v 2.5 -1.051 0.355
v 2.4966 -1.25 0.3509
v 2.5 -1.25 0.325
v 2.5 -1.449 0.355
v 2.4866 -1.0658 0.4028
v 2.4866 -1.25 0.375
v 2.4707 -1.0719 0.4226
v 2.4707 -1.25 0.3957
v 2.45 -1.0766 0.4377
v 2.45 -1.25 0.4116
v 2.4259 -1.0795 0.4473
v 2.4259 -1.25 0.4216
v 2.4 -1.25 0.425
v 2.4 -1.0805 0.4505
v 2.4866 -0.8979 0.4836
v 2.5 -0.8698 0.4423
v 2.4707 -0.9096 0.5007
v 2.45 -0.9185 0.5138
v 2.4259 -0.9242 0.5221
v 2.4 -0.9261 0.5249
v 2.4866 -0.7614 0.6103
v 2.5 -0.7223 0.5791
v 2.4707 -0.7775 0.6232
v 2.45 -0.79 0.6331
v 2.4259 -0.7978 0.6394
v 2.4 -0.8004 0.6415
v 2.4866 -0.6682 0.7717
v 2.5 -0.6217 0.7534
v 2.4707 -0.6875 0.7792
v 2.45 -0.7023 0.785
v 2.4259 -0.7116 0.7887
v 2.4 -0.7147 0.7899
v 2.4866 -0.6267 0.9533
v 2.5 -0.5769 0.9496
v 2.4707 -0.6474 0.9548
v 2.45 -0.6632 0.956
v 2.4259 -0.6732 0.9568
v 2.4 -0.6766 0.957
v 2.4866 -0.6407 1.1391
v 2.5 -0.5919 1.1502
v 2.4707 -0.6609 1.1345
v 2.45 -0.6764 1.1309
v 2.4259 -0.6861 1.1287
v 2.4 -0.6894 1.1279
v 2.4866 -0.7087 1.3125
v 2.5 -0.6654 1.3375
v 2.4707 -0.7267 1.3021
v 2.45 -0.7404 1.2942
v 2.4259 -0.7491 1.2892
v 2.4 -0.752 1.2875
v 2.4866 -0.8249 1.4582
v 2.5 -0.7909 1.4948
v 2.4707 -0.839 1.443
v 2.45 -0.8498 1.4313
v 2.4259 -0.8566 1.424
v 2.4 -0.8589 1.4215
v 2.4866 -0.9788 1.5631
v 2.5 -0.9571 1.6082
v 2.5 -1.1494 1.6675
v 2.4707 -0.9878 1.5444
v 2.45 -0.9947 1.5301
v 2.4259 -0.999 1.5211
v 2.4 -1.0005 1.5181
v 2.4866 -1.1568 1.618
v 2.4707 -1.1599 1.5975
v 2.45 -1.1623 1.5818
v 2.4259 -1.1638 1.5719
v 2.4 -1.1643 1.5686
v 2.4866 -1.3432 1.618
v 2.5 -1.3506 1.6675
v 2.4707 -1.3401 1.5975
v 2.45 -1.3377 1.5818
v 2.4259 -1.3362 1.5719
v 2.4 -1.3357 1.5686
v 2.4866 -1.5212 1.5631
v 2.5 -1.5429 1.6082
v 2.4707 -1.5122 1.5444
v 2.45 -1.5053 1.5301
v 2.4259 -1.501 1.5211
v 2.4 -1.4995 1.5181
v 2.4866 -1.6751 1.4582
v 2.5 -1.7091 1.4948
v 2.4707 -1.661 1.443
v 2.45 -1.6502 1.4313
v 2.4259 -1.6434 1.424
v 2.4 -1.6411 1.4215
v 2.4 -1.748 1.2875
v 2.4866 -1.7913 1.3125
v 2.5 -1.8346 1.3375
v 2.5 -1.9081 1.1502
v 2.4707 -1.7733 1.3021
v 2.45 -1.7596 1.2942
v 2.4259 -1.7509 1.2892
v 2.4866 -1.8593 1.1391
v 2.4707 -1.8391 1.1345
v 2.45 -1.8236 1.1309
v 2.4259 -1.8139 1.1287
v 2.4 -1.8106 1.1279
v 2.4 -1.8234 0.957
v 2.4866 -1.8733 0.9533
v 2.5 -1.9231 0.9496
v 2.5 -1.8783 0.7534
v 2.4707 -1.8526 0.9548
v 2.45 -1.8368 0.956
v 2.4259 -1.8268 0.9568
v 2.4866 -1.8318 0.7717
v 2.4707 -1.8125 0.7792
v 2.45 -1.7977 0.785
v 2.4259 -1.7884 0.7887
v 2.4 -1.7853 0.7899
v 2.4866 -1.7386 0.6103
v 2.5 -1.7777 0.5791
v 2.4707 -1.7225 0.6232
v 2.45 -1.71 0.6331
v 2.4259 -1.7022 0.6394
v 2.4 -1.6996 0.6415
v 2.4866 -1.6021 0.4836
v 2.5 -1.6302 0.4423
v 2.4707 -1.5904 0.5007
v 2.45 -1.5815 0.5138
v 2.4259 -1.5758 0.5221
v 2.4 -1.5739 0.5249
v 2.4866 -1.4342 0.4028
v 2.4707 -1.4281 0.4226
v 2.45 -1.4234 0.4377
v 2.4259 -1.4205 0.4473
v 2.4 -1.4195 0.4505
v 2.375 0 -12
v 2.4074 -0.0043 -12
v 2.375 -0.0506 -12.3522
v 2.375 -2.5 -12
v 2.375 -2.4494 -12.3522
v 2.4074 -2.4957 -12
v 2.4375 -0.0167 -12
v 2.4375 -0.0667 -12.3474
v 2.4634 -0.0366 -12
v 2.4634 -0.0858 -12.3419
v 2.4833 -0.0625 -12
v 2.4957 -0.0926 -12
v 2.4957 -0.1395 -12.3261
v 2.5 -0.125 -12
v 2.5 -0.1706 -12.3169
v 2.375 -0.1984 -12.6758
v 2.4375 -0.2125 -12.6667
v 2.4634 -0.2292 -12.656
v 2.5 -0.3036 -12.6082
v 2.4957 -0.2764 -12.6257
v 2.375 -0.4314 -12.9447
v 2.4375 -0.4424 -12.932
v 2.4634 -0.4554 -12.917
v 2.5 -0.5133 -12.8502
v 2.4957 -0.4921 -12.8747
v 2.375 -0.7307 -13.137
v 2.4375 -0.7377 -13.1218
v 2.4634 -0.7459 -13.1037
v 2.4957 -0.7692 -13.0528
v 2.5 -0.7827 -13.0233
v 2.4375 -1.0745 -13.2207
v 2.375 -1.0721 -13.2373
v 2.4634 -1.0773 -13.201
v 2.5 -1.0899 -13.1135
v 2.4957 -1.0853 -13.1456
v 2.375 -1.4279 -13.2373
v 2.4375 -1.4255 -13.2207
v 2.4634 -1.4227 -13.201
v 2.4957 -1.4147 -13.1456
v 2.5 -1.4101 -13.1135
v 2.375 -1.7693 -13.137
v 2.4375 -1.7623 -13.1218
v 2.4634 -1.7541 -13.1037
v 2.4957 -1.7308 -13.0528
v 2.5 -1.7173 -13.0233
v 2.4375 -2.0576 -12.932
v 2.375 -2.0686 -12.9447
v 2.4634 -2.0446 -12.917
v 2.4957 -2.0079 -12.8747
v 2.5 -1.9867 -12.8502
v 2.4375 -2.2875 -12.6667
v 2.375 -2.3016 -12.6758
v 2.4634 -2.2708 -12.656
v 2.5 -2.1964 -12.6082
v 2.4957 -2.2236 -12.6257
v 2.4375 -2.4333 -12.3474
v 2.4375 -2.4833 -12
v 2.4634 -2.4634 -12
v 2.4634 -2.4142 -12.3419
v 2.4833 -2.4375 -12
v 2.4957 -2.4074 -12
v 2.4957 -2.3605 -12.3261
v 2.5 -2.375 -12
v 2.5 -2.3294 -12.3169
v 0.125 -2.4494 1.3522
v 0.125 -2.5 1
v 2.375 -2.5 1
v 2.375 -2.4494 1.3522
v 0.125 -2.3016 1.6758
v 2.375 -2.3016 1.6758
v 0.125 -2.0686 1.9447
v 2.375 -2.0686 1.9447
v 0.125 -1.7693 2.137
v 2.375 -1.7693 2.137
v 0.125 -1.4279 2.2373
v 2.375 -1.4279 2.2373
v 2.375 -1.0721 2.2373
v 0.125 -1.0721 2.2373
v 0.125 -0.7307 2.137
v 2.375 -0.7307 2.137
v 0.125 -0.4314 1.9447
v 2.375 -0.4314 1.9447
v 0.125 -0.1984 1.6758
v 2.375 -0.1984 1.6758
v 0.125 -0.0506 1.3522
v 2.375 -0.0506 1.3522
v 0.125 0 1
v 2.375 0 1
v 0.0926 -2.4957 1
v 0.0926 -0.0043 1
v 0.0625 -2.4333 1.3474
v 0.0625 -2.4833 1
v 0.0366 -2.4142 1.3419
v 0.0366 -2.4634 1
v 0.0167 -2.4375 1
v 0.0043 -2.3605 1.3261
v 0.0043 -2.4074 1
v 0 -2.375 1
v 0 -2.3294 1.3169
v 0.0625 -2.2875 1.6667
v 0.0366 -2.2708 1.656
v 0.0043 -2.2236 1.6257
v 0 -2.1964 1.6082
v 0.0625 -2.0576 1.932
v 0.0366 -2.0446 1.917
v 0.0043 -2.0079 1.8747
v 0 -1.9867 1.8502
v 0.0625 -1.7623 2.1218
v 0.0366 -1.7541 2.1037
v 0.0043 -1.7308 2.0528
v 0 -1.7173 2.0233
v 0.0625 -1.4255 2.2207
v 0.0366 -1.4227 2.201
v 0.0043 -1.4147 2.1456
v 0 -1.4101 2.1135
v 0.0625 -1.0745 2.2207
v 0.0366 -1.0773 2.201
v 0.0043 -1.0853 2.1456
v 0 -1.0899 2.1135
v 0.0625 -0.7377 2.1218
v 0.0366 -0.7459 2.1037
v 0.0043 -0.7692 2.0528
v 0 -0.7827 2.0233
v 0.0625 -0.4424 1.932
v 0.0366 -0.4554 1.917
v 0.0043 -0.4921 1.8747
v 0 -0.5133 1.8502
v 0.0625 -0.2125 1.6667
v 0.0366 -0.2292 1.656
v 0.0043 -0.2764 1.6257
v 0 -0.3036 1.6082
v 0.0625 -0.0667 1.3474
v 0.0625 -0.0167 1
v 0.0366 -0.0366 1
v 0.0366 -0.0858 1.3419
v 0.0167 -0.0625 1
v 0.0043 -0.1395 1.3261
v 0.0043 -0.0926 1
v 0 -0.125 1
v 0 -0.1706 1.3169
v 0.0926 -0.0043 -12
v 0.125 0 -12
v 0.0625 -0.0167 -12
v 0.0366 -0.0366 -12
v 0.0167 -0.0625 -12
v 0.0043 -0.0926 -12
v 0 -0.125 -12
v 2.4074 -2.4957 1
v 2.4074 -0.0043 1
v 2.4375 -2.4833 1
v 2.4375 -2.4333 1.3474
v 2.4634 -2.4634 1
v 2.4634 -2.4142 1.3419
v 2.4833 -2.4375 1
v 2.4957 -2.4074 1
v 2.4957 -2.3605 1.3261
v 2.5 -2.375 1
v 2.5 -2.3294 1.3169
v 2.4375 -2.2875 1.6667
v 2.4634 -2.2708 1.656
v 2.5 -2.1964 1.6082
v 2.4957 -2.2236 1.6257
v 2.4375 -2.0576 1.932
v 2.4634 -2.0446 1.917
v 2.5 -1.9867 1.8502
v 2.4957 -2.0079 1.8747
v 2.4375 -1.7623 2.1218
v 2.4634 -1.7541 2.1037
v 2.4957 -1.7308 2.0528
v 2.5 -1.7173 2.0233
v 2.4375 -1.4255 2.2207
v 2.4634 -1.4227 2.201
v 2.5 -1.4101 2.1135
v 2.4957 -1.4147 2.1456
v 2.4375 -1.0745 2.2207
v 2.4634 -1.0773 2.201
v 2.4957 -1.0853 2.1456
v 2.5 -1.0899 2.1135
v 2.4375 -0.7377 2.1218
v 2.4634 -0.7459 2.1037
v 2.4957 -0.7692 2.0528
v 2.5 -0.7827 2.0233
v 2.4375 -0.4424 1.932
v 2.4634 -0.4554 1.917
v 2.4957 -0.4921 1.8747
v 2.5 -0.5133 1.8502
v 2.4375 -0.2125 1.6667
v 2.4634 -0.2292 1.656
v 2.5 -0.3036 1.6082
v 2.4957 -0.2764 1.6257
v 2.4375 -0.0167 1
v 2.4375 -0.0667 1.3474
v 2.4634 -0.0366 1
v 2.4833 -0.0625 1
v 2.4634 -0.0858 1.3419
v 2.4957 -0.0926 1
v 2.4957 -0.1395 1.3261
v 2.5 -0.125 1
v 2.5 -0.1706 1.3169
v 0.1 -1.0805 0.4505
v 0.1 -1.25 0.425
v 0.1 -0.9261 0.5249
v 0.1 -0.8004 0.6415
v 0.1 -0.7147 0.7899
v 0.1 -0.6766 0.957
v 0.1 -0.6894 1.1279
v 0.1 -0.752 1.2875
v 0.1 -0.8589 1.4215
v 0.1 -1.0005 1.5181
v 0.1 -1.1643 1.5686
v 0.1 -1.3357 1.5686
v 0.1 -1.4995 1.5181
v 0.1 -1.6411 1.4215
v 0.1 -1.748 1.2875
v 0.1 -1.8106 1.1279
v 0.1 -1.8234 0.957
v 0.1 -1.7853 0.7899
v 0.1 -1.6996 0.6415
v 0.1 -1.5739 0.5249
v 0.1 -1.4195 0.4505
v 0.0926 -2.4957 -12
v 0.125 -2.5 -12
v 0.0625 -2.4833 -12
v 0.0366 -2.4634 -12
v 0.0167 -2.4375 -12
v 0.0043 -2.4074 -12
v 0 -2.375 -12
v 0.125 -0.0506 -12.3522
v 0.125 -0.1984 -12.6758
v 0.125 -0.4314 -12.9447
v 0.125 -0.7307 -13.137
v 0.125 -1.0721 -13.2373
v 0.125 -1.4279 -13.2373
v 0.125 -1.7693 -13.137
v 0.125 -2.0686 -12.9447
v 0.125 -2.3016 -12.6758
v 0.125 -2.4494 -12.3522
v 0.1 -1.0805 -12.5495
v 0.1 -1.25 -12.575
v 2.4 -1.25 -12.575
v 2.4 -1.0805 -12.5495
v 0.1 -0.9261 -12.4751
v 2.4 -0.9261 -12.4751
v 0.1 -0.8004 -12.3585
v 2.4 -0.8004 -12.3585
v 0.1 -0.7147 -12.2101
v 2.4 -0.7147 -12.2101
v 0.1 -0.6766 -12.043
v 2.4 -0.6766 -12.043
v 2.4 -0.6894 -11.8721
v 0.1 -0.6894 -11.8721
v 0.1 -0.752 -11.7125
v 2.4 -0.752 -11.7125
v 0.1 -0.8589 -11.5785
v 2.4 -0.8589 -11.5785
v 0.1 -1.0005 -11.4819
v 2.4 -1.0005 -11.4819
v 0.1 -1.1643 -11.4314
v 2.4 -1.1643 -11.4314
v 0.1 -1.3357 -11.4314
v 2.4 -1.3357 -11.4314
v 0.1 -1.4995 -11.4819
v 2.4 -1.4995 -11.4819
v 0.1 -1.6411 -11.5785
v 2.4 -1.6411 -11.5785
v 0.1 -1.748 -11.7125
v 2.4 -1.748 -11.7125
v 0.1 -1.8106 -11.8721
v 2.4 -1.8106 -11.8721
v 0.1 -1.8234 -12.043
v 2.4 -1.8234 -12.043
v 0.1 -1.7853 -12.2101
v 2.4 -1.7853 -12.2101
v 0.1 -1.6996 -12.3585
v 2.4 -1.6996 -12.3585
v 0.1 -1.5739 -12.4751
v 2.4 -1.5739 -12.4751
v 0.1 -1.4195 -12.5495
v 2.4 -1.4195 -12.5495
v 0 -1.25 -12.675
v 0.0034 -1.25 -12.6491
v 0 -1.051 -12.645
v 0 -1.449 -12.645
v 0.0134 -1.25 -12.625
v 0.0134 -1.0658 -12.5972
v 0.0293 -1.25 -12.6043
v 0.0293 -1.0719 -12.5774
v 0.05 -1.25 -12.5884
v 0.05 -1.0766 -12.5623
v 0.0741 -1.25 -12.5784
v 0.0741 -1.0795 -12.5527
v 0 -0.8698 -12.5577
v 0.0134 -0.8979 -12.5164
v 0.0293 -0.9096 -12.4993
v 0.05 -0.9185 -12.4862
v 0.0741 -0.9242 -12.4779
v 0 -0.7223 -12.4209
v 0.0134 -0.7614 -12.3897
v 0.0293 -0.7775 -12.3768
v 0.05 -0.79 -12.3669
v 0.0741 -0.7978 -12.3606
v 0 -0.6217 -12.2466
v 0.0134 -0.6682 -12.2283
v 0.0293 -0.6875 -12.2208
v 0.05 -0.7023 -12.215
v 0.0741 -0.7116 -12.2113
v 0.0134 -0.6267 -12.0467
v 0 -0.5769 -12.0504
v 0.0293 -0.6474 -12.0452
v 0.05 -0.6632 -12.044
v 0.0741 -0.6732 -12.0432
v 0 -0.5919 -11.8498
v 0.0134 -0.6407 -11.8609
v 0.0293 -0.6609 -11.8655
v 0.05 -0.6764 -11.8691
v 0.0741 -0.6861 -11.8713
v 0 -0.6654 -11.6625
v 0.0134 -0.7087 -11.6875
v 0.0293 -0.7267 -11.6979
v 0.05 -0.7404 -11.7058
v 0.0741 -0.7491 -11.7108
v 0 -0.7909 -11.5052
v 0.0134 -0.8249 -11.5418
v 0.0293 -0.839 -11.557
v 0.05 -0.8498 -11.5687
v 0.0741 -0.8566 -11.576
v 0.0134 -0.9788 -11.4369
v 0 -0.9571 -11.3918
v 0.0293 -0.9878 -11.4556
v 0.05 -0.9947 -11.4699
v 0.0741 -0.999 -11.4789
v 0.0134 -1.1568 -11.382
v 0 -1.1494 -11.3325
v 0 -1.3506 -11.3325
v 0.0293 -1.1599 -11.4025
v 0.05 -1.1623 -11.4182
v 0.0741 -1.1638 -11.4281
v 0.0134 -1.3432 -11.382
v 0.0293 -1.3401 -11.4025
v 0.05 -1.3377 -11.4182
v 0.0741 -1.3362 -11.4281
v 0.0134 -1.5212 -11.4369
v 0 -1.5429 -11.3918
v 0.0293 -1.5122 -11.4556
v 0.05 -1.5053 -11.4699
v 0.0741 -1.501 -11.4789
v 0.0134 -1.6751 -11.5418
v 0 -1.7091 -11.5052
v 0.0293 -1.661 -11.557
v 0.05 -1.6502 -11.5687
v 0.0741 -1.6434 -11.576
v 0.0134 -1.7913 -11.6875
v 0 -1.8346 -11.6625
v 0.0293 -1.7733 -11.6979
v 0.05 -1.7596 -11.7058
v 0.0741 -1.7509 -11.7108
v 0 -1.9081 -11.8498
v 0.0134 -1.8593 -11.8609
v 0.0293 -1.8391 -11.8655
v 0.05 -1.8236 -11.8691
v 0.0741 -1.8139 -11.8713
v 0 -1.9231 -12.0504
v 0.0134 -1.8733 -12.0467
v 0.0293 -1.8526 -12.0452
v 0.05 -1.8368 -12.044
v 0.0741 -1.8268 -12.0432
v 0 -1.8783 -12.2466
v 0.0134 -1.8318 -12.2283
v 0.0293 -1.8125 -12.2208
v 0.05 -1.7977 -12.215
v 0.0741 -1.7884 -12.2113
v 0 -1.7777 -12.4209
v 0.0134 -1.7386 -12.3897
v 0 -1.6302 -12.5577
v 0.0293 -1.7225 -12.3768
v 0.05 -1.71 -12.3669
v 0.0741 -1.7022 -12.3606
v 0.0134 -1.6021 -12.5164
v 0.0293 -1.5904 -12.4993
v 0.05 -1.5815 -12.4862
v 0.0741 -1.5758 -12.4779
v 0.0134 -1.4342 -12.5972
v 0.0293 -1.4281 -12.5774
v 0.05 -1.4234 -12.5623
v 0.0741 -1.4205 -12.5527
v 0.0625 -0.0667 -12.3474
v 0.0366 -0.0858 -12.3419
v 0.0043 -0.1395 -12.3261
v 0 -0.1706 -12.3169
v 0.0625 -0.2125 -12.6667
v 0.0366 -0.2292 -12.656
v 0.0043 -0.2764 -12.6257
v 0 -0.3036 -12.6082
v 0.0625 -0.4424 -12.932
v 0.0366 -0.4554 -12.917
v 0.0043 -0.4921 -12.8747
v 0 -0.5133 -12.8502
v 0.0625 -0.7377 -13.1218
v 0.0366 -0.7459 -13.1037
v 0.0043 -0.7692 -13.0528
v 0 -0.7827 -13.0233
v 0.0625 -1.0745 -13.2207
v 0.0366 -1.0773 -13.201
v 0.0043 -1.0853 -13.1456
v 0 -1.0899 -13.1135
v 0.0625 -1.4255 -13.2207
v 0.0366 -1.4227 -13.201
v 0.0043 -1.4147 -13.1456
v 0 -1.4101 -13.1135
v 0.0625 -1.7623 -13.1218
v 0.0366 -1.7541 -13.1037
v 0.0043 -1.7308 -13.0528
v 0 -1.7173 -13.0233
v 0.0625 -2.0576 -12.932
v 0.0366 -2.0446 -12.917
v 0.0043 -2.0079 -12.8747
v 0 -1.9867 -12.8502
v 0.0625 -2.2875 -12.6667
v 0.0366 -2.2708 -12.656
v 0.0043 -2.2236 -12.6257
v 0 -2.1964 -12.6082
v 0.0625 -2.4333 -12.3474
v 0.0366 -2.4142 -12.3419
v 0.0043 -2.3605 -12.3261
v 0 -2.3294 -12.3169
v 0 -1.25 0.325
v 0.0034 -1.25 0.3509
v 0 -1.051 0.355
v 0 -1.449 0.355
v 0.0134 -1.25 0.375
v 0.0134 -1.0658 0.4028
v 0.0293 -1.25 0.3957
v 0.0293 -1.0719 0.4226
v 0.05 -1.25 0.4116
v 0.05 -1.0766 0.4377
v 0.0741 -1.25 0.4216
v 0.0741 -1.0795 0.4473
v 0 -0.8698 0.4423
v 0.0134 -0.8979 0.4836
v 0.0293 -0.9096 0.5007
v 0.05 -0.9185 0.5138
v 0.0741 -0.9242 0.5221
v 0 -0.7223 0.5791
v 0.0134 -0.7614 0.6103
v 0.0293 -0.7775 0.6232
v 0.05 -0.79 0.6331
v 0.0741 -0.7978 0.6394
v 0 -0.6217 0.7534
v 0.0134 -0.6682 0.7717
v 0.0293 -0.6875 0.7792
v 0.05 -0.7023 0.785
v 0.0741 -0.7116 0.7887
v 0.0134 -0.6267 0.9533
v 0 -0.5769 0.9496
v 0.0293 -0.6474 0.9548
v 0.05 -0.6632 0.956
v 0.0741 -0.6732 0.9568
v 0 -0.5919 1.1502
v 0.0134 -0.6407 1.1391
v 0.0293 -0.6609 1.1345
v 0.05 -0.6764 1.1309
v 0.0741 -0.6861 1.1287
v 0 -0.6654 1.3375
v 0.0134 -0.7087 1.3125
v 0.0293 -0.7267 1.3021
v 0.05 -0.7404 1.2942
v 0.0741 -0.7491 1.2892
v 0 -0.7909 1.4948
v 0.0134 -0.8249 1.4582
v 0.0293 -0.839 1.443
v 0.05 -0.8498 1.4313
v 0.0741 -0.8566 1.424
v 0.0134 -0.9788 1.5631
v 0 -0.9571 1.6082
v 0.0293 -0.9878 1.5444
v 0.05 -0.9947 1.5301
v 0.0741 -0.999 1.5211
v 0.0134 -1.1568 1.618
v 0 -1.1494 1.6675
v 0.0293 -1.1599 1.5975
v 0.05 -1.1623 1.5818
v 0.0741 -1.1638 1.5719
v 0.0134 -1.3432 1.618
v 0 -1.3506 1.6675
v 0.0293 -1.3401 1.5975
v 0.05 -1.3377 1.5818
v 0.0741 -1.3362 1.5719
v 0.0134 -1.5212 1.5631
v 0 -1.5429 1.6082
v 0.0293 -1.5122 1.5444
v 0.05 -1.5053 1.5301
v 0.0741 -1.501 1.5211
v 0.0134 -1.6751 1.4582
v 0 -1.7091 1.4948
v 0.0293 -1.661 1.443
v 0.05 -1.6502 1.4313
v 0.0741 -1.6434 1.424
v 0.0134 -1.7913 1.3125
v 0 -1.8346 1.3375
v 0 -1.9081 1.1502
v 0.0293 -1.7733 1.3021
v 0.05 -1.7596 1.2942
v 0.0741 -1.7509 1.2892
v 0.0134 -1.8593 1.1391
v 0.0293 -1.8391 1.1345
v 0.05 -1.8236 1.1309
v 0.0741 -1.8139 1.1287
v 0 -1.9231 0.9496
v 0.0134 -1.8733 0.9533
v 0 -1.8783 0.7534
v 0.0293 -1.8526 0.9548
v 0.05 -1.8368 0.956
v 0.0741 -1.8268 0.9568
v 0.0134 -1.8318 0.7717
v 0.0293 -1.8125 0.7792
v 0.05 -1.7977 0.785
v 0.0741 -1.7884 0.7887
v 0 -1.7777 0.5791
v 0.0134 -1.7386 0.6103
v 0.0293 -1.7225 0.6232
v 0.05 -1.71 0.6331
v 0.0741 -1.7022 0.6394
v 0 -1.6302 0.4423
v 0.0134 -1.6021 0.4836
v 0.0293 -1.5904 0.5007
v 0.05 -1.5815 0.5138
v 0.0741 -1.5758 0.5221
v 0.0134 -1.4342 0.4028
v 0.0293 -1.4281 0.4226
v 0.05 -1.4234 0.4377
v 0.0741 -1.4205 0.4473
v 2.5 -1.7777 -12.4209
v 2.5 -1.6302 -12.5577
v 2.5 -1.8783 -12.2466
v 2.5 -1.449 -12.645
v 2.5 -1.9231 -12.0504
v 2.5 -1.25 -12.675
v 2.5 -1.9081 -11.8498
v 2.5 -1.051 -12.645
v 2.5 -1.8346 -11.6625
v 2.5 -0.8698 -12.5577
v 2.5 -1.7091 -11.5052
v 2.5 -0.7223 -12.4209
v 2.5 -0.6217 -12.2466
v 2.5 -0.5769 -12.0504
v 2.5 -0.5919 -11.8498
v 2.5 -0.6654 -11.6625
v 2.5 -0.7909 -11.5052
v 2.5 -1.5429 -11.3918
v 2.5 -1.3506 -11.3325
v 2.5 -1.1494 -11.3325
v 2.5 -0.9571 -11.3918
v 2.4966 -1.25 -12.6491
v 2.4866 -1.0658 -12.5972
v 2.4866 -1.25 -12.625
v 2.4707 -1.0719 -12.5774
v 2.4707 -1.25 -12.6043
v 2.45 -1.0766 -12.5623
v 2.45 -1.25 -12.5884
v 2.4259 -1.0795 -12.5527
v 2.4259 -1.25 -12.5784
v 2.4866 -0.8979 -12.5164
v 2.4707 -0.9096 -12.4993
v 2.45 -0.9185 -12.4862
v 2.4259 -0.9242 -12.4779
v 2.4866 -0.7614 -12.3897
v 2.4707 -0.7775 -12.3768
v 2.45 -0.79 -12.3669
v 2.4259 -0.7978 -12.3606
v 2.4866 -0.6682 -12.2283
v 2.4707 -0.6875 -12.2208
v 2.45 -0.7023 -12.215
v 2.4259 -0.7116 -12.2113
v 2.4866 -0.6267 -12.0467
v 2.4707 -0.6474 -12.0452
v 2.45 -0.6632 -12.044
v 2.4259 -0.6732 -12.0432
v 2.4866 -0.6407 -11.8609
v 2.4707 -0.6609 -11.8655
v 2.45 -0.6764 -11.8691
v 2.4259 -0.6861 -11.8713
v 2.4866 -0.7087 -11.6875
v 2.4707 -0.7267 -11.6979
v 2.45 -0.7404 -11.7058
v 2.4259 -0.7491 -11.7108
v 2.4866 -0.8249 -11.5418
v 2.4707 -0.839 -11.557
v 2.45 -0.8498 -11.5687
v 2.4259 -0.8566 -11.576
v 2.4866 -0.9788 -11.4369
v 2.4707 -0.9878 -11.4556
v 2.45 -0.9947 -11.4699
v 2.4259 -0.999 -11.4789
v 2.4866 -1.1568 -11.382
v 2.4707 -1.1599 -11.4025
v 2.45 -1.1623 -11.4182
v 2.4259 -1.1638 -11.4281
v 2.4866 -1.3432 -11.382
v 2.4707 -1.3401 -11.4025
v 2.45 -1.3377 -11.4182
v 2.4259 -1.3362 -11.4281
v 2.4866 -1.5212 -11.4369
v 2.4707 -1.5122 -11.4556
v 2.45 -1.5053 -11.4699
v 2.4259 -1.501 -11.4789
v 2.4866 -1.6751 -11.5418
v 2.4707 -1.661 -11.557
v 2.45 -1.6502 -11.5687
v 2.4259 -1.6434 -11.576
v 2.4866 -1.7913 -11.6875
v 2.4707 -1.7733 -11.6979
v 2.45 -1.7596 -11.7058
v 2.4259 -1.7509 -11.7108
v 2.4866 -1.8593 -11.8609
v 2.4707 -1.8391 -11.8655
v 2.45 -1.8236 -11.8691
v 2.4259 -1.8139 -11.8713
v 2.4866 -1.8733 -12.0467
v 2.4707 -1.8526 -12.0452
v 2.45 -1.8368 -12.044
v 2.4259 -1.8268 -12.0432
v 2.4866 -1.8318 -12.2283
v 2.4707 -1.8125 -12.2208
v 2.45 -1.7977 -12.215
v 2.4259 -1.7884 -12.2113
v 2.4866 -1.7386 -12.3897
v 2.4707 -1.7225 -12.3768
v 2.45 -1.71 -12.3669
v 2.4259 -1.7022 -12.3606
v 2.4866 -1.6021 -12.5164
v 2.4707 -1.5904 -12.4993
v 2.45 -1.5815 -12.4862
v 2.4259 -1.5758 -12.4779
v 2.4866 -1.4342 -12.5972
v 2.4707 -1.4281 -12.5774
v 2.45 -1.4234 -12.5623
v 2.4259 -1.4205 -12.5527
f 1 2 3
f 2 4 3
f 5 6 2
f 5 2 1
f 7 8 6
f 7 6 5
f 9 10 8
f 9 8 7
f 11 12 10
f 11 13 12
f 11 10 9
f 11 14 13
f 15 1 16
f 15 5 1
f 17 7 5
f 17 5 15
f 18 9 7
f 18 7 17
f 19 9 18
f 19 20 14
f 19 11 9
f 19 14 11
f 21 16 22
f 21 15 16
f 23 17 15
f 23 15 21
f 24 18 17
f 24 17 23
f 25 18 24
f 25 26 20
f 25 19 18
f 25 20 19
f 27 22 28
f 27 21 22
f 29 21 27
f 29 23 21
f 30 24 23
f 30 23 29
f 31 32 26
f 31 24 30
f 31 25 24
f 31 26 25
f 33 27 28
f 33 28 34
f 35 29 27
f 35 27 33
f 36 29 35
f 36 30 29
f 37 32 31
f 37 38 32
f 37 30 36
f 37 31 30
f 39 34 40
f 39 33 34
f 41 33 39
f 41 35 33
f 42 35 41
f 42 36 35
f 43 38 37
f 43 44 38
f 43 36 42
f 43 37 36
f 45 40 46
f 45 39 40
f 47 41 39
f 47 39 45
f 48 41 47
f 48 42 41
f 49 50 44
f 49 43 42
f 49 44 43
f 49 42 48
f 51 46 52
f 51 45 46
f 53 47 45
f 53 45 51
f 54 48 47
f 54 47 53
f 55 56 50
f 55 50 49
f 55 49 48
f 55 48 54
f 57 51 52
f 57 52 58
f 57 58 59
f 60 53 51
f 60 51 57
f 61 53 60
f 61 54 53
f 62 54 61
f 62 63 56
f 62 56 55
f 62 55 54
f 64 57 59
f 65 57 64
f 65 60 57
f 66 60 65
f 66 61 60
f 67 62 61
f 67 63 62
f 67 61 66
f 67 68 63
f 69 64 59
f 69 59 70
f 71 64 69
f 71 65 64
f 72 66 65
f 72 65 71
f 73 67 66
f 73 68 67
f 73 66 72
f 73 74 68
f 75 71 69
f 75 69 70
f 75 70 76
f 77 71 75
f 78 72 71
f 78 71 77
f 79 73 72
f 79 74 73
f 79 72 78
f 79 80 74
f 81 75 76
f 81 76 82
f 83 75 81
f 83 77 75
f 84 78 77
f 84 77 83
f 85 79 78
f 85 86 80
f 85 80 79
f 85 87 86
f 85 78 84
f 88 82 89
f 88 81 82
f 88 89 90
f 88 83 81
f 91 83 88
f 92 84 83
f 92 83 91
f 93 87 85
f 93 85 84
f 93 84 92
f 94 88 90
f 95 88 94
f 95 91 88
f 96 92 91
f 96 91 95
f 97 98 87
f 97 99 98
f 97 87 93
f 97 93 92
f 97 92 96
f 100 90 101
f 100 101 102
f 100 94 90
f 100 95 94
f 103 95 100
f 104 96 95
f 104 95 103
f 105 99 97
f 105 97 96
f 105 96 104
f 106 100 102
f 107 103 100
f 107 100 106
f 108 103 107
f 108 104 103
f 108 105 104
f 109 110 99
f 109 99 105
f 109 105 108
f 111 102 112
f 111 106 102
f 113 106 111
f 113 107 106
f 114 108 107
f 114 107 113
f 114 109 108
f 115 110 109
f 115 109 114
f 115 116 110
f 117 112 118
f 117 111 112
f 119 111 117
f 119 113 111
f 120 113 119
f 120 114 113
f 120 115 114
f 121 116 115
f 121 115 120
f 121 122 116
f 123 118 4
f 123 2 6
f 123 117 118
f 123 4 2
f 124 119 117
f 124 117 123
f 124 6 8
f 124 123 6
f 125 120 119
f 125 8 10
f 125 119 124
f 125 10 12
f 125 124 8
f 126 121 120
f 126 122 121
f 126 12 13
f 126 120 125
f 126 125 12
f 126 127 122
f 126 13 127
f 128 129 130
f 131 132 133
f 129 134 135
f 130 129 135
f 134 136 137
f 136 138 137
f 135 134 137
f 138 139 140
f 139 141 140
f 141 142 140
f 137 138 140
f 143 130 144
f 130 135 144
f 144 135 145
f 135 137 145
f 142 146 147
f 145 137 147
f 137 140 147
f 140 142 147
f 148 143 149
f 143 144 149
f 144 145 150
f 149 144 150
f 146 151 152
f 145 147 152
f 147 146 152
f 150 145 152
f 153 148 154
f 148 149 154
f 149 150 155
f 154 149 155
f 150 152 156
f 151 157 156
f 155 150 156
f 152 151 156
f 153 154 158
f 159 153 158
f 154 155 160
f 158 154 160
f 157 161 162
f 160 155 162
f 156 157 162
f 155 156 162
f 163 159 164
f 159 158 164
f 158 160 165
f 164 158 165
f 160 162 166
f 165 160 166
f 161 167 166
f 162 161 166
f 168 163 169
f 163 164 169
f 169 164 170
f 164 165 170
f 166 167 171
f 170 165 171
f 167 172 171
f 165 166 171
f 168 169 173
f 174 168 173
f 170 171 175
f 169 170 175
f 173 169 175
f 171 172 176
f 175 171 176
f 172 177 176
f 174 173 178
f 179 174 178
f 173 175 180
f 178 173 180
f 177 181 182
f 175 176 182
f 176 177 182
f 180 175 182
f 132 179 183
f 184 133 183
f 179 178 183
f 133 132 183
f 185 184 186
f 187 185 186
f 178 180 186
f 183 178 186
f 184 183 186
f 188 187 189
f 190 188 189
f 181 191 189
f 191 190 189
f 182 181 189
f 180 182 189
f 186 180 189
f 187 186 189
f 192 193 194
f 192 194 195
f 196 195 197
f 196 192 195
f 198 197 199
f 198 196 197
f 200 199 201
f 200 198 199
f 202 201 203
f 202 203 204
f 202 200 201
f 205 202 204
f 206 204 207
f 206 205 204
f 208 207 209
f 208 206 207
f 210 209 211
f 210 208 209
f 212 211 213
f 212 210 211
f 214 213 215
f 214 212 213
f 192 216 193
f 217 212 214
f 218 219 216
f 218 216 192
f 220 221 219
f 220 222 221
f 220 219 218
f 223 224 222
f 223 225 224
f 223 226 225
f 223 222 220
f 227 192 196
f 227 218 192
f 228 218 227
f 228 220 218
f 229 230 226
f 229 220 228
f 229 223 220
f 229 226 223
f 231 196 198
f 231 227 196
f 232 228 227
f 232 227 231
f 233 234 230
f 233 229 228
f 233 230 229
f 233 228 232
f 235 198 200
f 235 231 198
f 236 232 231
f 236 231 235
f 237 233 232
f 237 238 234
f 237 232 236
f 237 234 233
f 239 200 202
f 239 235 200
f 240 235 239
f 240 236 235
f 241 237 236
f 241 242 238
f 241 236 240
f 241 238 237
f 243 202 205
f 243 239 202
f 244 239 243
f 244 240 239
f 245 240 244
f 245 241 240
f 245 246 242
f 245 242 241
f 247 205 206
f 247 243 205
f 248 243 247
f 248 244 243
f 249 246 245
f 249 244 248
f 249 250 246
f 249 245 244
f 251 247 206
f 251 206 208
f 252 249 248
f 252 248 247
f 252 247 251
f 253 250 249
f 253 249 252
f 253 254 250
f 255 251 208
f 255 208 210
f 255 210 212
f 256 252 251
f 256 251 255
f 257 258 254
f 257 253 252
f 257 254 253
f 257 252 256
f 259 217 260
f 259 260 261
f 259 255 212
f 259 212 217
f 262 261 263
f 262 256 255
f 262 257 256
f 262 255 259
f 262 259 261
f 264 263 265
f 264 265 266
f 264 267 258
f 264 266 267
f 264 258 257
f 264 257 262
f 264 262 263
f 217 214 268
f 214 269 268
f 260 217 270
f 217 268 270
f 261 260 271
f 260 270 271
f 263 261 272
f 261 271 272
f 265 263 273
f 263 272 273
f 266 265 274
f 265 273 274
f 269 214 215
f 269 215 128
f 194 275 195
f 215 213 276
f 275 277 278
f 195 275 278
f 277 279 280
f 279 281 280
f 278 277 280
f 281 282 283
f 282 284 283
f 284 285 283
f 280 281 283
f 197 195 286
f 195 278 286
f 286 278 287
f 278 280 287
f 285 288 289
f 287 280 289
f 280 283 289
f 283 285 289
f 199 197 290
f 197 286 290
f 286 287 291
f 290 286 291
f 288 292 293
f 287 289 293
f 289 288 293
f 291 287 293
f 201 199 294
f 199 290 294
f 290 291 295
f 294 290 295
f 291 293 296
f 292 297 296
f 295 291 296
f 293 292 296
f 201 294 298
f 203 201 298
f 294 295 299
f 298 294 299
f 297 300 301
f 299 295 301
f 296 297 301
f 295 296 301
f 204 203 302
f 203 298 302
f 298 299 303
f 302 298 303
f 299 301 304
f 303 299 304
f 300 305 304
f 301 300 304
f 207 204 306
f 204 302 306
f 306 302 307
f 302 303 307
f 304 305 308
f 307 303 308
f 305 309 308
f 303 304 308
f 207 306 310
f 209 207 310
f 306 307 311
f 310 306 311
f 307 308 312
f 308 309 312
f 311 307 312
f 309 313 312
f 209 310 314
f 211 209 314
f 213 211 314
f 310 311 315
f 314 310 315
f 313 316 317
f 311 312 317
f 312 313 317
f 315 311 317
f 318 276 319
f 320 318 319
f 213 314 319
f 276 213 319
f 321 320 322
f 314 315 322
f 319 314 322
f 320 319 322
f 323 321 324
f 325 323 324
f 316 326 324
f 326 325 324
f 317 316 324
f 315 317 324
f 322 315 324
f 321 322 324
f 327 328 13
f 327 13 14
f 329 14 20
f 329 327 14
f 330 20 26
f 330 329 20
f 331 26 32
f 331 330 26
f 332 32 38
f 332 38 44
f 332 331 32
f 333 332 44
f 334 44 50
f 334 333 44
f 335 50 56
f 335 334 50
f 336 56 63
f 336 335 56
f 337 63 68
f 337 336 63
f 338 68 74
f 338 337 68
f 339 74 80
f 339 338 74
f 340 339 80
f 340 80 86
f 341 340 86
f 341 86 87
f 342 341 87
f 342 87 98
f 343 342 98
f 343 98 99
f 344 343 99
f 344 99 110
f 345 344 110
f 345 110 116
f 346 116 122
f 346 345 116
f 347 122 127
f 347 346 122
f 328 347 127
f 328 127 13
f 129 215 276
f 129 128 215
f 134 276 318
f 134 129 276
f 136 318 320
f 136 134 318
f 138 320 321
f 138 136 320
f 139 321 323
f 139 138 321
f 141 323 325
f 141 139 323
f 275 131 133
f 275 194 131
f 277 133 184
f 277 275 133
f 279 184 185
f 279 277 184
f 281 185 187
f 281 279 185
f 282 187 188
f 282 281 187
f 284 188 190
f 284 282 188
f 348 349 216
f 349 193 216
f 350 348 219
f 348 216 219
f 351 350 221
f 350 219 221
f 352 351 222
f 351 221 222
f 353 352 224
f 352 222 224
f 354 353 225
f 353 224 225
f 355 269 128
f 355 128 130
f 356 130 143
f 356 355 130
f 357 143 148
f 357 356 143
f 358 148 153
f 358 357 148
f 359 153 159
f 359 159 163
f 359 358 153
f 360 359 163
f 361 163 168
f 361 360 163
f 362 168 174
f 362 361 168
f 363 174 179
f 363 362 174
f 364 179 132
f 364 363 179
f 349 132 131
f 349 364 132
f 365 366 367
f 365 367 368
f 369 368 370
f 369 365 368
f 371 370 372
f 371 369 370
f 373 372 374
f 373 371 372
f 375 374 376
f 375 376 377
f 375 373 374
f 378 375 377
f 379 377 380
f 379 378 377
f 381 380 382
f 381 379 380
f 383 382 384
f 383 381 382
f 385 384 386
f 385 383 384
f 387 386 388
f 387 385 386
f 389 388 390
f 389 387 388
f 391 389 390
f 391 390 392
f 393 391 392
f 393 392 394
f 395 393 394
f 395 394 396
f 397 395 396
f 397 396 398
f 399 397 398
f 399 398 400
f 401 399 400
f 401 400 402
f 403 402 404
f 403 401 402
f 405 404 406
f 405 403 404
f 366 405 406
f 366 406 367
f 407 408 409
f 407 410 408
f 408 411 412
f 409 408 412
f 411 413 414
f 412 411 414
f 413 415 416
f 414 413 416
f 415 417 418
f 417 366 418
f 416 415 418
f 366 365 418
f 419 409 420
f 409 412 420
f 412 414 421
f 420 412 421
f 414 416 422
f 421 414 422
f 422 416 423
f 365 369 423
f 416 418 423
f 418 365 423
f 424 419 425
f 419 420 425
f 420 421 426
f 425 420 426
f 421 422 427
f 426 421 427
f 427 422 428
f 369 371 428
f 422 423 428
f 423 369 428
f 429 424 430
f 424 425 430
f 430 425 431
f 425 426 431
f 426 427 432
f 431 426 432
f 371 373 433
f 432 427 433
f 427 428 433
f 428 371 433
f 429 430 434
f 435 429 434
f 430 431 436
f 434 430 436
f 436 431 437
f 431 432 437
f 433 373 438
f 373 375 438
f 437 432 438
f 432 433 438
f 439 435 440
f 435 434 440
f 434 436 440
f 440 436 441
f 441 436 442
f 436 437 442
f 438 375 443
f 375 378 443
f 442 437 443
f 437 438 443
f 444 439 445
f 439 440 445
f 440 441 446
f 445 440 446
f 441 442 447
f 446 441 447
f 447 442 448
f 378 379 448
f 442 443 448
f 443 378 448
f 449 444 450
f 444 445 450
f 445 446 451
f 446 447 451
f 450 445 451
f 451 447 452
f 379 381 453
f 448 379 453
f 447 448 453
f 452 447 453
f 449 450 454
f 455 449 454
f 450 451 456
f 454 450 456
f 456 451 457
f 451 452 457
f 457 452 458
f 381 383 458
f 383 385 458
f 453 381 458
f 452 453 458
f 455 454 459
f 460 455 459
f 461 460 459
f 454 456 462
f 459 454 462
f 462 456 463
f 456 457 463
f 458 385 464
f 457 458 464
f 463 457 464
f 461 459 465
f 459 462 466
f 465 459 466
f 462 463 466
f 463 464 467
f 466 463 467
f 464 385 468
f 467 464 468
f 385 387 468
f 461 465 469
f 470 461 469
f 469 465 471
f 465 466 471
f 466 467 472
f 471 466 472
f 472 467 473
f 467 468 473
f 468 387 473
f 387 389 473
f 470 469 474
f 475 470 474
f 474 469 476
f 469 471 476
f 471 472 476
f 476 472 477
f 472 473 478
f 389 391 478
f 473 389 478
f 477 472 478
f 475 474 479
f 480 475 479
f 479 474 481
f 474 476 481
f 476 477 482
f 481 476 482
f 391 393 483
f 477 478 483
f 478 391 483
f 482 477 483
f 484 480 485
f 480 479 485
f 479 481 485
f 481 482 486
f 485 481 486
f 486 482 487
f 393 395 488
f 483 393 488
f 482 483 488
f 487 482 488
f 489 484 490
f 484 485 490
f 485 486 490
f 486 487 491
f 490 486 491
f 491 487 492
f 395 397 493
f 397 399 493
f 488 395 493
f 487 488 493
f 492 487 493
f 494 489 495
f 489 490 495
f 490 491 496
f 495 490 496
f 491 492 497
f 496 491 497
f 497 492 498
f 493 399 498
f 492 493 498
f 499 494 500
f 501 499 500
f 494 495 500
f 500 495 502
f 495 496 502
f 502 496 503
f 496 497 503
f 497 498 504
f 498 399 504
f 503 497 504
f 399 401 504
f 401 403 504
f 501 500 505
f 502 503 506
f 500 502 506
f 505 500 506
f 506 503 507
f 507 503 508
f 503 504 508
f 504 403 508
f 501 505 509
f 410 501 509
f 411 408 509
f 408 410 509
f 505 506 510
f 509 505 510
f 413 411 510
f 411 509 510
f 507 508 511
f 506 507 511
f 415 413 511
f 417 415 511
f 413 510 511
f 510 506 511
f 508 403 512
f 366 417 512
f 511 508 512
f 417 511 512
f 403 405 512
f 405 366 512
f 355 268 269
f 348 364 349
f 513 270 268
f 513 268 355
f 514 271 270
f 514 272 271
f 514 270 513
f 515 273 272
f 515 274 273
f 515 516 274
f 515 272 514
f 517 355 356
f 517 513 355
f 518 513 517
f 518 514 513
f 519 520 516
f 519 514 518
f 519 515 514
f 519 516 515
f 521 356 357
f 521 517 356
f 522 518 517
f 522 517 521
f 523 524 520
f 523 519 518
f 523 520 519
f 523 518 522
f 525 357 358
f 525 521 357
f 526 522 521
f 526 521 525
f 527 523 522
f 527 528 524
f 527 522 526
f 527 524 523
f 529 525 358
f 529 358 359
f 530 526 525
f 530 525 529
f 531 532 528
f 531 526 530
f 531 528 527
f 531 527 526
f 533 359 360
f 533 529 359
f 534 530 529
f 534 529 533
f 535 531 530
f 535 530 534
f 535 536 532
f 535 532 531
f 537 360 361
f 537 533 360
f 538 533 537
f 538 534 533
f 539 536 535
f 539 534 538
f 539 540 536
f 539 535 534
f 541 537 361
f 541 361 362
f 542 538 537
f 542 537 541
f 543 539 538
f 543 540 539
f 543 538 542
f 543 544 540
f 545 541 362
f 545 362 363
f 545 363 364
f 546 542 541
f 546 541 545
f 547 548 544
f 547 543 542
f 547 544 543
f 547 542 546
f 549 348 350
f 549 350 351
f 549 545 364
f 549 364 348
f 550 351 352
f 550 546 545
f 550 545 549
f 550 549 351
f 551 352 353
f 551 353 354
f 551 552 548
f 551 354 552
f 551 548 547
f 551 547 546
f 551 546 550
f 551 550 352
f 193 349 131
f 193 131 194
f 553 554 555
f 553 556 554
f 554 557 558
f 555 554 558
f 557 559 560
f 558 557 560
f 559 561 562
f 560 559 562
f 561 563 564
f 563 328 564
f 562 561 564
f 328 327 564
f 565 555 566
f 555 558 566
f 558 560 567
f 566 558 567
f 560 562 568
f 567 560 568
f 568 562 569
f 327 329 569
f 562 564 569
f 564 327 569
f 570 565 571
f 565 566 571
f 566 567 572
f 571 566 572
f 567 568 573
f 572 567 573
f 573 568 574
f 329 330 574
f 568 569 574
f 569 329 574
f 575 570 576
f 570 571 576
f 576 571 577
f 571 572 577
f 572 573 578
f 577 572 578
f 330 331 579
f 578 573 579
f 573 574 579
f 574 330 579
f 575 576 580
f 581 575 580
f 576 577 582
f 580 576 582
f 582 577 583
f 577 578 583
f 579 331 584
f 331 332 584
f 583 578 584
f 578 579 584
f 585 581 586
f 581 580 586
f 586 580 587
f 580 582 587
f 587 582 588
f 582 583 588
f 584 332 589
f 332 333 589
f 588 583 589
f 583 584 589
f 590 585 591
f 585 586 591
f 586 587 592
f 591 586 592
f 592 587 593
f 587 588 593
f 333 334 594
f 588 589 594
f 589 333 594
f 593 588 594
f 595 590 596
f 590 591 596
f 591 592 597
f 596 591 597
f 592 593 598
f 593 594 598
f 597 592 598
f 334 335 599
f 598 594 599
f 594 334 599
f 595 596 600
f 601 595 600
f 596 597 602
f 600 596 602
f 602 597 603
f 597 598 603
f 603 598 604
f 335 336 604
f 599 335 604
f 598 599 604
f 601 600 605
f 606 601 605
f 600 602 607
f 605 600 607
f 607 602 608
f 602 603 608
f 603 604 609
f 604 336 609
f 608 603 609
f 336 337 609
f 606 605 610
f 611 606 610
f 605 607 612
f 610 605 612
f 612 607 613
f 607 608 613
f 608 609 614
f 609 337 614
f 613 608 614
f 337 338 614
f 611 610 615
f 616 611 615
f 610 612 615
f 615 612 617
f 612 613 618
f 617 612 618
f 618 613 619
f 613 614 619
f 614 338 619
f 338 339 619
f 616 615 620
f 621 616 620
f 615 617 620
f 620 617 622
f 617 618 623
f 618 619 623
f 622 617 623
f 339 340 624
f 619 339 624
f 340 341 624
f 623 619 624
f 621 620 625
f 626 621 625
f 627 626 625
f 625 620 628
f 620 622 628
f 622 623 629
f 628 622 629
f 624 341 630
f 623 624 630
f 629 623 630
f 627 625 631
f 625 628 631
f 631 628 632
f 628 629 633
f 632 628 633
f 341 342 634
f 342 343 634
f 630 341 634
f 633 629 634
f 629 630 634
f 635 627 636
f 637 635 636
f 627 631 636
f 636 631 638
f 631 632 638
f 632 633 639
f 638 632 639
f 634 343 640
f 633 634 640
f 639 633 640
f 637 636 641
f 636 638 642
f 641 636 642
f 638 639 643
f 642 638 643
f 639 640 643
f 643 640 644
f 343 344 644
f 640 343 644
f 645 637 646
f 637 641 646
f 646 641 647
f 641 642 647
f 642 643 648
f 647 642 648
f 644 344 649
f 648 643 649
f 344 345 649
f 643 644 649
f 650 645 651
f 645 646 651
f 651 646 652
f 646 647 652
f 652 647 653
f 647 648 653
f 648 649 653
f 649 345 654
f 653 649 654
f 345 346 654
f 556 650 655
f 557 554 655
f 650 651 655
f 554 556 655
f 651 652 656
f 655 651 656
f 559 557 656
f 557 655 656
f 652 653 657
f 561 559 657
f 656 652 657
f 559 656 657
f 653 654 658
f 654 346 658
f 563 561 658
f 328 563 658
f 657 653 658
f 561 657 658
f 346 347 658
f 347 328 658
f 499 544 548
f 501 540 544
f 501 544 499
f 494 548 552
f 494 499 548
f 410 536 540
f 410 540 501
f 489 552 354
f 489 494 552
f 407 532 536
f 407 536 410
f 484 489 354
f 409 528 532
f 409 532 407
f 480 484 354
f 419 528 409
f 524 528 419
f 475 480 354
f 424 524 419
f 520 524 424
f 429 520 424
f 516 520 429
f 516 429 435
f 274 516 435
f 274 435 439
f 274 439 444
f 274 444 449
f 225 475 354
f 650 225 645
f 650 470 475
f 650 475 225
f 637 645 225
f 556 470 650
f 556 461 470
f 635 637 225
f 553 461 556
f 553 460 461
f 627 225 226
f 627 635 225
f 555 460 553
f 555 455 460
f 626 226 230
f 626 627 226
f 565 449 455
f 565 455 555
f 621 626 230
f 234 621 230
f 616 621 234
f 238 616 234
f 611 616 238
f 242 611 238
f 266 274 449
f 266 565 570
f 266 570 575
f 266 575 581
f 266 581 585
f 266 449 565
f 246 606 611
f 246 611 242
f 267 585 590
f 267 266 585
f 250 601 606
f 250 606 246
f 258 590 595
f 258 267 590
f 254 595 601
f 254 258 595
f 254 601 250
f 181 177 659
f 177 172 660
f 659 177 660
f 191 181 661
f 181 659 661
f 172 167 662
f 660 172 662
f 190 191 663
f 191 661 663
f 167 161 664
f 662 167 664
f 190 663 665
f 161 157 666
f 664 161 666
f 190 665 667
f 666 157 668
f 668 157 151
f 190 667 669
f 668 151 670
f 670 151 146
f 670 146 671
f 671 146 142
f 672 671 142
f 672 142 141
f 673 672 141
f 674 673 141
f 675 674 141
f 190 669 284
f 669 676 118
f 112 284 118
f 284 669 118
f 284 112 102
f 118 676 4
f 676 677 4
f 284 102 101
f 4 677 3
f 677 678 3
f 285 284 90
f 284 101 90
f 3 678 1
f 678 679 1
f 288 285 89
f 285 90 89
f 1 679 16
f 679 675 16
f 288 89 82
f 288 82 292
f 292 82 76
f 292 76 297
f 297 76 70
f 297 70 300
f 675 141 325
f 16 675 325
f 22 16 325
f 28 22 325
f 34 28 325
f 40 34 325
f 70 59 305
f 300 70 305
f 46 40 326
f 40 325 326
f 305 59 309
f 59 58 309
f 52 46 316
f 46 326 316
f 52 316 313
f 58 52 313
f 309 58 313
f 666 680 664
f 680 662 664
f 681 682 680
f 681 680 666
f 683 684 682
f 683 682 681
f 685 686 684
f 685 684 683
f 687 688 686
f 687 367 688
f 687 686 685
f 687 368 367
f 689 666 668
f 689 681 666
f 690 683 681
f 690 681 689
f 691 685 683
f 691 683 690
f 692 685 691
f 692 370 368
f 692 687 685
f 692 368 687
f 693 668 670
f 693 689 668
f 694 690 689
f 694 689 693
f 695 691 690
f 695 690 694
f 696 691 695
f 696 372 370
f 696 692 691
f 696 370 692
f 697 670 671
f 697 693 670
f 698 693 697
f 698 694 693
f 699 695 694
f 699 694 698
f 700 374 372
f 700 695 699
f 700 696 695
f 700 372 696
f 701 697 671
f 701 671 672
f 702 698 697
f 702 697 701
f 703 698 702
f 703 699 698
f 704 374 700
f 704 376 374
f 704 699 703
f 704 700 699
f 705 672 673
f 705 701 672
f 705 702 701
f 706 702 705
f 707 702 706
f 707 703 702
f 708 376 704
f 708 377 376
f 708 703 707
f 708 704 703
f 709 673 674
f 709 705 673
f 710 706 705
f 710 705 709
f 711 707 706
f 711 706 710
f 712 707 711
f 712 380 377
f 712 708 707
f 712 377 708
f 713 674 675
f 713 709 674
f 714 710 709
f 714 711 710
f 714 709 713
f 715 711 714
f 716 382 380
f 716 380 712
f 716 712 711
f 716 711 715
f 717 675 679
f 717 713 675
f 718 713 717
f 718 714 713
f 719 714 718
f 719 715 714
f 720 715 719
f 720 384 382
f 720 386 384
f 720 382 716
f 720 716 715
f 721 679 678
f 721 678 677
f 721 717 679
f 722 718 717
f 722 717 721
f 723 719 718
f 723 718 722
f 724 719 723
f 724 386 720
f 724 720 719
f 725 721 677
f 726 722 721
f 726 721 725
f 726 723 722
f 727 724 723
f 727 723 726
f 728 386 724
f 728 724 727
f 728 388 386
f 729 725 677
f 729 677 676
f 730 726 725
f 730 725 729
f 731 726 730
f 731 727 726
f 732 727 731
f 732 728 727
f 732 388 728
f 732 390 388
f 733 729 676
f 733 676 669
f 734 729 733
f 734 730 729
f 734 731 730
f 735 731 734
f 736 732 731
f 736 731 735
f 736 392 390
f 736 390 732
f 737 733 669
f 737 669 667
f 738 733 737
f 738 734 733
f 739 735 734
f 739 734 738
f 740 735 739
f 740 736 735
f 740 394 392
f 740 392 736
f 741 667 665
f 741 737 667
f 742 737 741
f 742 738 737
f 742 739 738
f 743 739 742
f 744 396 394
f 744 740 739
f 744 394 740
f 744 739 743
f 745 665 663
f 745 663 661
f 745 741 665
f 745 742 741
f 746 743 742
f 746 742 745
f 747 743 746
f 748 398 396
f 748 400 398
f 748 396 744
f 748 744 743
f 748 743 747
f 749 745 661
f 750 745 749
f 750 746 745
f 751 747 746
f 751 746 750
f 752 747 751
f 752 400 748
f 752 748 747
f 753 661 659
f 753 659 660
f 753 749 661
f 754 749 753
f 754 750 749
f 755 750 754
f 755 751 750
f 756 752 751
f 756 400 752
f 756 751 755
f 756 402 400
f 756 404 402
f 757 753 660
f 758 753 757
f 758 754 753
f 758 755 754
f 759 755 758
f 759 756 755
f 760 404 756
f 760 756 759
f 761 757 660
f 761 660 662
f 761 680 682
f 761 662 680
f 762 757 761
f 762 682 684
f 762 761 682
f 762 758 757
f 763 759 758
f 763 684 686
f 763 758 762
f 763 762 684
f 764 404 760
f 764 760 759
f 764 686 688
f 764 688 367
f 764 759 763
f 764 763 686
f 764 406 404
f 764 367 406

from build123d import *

# Parameters (mm, degrees)
SKETCH1_R           = 0.575
BOSS_EXTRUDE1_DEPTH = 2.5
FILLET1_R           = 0.125
FILLET2_R           = 0.1


with BuildPart() as part:
    # Sketch1 → Boss-Extrude1 (new body)
    with BuildSketch(Plane(origin=(0, 0, 0), x_dir=(0, 0, -1), z_dir=(1, 0, 0))):
        with BuildLine():
            ThreePointArc((12, 0), (13.25, -1.25), (12, -2.5))
            Line((12, -2.5), (11, -2.5))
            Line((11, -2.5), (0, -2.5))
            Line((0, -2.5), (-1, -2.5))
            ThreePointArc((-1, -2.5), (-2.25, -1.25), (-1, 0))
            Line((-1, 0), (0, 0))
            Line((0, 0), (11, 0))
            Line((11, 0), (12, 0))
        make_face()
        with Locations((12, -1.25)):
            Circle(SKETCH1_R, mode=Mode.SUBTRACT)
        with Locations((-1, -1.25)):
            Circle(SKETCH1_R, mode=Mode.SUBTRACT)
    extrude(amount=BOSS_EXTRUDE1_DEPTH)

    # Fillet1
    fillet1_edges = [part.edges().sort_by_distance(p)[0] for p in [
        (0, -1.25, 2.25),
        (0, 0, -5.5),
        (0, -1.25, -13.25),
        (2.5, 0, -5.5),
        (2.5, -1.25, 2.25),
        (2.5, -2.5, -5.5),
        (2.5, -1.25, -13.25),
        (0, -2.5, -5.5),
    ]]
    fillet(fillet1_edges, radius=FILLET1_R)

    # Fillet2
    fillet2_edges = [part.edges().sort_by_distance(p)[0] for p in [
        (2.5, -1.25, -11.425),
        (2.5, -1.25, 1.575),
        (0, -1.25, 1.575),
        (0, -1.25, -11.425),
    ]]
    fillet(fillet2_edges, radius=FILLET2_R)


solid = part.part
